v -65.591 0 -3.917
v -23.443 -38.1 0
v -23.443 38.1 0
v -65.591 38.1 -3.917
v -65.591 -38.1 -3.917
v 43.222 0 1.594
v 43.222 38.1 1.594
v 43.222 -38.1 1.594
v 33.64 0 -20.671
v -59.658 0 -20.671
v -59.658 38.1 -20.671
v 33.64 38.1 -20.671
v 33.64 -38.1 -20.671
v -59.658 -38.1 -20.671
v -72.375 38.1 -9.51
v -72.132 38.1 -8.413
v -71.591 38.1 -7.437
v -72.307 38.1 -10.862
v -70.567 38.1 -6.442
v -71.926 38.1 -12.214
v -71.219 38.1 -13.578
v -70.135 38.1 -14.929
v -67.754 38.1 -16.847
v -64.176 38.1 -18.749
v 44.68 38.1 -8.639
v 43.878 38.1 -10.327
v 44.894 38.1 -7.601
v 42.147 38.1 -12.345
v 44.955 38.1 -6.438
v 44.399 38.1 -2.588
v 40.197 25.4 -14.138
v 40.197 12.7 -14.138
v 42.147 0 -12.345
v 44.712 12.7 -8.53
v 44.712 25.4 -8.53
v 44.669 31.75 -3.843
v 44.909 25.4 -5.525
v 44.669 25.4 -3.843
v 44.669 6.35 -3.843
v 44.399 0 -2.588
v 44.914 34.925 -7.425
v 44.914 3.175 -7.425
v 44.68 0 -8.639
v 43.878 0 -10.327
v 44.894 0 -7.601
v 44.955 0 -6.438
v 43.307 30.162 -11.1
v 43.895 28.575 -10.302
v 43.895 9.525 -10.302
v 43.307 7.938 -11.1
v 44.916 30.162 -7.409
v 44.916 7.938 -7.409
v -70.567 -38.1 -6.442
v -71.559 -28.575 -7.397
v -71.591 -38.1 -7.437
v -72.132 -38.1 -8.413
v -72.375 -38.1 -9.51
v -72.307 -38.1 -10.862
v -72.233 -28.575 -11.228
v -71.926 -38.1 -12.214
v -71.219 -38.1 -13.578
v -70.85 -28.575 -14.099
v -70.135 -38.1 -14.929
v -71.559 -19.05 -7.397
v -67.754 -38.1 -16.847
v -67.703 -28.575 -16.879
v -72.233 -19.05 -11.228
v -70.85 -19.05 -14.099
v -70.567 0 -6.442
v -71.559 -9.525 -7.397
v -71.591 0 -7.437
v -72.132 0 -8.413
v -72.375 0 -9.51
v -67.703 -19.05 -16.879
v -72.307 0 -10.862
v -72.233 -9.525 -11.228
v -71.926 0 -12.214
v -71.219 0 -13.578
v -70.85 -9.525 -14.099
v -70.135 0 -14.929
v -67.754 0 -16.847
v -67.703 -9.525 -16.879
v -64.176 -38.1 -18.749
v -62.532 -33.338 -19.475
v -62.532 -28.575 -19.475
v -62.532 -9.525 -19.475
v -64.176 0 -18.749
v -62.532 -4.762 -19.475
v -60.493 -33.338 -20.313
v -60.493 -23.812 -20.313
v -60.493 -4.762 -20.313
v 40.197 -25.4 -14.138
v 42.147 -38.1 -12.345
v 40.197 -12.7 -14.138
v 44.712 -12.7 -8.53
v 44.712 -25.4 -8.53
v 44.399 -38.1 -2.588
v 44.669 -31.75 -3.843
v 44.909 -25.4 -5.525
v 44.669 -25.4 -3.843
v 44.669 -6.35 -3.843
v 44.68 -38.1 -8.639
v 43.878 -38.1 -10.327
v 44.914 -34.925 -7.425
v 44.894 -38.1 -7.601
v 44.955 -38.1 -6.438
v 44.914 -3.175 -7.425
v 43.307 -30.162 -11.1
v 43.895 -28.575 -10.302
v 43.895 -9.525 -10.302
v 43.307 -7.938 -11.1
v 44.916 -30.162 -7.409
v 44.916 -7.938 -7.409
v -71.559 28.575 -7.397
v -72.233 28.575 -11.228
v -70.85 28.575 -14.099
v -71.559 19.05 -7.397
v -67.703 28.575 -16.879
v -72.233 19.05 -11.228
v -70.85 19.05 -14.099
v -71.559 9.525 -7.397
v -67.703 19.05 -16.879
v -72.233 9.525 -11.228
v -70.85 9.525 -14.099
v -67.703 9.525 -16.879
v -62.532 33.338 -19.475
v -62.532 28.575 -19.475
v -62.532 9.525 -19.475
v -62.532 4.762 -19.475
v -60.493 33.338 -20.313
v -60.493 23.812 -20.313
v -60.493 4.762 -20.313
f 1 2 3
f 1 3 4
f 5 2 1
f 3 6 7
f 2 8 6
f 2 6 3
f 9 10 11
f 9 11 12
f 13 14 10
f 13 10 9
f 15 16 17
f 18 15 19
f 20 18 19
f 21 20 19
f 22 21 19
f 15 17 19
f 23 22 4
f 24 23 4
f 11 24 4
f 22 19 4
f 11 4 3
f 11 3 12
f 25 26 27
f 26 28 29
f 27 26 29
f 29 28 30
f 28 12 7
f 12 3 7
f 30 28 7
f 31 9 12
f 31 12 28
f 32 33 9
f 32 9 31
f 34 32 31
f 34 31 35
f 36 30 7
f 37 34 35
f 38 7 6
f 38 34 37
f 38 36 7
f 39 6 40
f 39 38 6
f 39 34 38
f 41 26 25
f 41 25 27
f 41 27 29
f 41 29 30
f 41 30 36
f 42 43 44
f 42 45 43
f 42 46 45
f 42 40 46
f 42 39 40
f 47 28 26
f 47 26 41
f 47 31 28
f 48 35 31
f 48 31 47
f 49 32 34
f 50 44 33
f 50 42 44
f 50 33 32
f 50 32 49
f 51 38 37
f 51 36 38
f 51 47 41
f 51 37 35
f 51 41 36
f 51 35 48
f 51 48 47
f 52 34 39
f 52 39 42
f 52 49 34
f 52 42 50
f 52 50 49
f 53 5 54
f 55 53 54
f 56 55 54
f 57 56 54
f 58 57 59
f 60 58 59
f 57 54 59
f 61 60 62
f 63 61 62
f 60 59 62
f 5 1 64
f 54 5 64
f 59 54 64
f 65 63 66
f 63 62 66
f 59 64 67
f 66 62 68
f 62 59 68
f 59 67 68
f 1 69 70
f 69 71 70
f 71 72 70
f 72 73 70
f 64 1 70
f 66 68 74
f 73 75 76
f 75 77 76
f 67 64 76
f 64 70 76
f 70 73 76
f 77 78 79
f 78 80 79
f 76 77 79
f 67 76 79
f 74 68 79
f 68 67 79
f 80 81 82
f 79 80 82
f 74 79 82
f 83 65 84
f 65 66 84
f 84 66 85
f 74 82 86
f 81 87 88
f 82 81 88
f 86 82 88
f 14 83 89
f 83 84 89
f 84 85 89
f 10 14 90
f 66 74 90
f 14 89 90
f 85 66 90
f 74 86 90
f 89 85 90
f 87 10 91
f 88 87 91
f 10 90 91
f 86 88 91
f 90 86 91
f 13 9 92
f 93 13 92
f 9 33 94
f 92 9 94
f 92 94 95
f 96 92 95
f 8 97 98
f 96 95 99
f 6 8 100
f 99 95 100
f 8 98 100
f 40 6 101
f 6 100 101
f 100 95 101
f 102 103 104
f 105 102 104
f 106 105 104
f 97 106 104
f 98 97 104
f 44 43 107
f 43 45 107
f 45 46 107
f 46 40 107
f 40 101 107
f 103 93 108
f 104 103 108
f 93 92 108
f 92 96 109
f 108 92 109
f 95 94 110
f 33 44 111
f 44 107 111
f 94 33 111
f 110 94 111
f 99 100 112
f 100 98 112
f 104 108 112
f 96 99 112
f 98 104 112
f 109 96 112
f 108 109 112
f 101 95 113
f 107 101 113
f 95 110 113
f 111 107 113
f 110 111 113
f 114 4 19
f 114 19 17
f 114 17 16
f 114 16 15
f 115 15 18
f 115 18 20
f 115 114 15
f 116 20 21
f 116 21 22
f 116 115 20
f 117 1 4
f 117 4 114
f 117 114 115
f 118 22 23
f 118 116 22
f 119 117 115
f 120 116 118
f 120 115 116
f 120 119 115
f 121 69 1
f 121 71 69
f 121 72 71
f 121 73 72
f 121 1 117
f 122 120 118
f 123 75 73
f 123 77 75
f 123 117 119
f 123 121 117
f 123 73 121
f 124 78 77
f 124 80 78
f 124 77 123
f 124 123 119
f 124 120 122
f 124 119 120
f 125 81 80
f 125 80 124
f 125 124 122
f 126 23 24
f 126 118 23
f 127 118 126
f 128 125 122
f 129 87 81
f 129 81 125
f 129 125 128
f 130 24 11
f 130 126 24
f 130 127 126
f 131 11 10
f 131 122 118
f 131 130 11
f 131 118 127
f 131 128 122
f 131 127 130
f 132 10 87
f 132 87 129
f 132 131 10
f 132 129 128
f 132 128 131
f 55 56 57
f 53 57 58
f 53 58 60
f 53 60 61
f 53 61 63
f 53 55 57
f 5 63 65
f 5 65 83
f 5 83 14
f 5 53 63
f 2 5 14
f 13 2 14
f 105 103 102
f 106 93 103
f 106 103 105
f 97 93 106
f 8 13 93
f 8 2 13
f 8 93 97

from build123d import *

# Parameters (mm, degrees)
F1_DEPTH = 38.1


with BuildPart() as f1:
    # F0 (on Front) → F1 (new body, symmetric)
    with BuildSketch(Plane.XZ):
        with BuildLine():
            Line((43.2224310935, 1.5943679027), (-23.4427358955, 0))
            Line((-23.4427358955, 0), (-65.5905306339, -3.9171427488))
            add(Edge.make_bspline(
                [(-65.5905306339, -3.9171427488), (-68.0041984956, -4.9276178366), (-72.229069768, -6.6963480077), (-72.7463312071, -11.6753389144), (-69.0538055852, -17.2946702596), (-59.6869487074, -20.5694560435), (-59.6583485603, -20.671416074)],
                knots=[0, 0, 0, 0, 0.2489109965, 0.4356924726, 0.6905546732, 0.9729684049, 0.9729684049, 0.9729684049, 0.9729684049], degree=3))
            Line((-59.6583485603, -20.671416074), (33.6398594081, -20.671416074))
            add(Edge.make_bspline(
                [(33.6398594081, -20.671416074), (35.8208168114, -18.40731191), (39.9250798829, -14.1465780249), (46.4031363616, -8.9319649582), (44.3428903861, -2.113717719), (43.2224310935, 1.5943679027)],
                knots=[0, 0, 0, 0, 0.3409172772, 0.6415596146, 1, 1, 1, 1], degree=3))
        make_face()
    extrude(amount=F1_DEPTH, both=True)


solid = f1.part
